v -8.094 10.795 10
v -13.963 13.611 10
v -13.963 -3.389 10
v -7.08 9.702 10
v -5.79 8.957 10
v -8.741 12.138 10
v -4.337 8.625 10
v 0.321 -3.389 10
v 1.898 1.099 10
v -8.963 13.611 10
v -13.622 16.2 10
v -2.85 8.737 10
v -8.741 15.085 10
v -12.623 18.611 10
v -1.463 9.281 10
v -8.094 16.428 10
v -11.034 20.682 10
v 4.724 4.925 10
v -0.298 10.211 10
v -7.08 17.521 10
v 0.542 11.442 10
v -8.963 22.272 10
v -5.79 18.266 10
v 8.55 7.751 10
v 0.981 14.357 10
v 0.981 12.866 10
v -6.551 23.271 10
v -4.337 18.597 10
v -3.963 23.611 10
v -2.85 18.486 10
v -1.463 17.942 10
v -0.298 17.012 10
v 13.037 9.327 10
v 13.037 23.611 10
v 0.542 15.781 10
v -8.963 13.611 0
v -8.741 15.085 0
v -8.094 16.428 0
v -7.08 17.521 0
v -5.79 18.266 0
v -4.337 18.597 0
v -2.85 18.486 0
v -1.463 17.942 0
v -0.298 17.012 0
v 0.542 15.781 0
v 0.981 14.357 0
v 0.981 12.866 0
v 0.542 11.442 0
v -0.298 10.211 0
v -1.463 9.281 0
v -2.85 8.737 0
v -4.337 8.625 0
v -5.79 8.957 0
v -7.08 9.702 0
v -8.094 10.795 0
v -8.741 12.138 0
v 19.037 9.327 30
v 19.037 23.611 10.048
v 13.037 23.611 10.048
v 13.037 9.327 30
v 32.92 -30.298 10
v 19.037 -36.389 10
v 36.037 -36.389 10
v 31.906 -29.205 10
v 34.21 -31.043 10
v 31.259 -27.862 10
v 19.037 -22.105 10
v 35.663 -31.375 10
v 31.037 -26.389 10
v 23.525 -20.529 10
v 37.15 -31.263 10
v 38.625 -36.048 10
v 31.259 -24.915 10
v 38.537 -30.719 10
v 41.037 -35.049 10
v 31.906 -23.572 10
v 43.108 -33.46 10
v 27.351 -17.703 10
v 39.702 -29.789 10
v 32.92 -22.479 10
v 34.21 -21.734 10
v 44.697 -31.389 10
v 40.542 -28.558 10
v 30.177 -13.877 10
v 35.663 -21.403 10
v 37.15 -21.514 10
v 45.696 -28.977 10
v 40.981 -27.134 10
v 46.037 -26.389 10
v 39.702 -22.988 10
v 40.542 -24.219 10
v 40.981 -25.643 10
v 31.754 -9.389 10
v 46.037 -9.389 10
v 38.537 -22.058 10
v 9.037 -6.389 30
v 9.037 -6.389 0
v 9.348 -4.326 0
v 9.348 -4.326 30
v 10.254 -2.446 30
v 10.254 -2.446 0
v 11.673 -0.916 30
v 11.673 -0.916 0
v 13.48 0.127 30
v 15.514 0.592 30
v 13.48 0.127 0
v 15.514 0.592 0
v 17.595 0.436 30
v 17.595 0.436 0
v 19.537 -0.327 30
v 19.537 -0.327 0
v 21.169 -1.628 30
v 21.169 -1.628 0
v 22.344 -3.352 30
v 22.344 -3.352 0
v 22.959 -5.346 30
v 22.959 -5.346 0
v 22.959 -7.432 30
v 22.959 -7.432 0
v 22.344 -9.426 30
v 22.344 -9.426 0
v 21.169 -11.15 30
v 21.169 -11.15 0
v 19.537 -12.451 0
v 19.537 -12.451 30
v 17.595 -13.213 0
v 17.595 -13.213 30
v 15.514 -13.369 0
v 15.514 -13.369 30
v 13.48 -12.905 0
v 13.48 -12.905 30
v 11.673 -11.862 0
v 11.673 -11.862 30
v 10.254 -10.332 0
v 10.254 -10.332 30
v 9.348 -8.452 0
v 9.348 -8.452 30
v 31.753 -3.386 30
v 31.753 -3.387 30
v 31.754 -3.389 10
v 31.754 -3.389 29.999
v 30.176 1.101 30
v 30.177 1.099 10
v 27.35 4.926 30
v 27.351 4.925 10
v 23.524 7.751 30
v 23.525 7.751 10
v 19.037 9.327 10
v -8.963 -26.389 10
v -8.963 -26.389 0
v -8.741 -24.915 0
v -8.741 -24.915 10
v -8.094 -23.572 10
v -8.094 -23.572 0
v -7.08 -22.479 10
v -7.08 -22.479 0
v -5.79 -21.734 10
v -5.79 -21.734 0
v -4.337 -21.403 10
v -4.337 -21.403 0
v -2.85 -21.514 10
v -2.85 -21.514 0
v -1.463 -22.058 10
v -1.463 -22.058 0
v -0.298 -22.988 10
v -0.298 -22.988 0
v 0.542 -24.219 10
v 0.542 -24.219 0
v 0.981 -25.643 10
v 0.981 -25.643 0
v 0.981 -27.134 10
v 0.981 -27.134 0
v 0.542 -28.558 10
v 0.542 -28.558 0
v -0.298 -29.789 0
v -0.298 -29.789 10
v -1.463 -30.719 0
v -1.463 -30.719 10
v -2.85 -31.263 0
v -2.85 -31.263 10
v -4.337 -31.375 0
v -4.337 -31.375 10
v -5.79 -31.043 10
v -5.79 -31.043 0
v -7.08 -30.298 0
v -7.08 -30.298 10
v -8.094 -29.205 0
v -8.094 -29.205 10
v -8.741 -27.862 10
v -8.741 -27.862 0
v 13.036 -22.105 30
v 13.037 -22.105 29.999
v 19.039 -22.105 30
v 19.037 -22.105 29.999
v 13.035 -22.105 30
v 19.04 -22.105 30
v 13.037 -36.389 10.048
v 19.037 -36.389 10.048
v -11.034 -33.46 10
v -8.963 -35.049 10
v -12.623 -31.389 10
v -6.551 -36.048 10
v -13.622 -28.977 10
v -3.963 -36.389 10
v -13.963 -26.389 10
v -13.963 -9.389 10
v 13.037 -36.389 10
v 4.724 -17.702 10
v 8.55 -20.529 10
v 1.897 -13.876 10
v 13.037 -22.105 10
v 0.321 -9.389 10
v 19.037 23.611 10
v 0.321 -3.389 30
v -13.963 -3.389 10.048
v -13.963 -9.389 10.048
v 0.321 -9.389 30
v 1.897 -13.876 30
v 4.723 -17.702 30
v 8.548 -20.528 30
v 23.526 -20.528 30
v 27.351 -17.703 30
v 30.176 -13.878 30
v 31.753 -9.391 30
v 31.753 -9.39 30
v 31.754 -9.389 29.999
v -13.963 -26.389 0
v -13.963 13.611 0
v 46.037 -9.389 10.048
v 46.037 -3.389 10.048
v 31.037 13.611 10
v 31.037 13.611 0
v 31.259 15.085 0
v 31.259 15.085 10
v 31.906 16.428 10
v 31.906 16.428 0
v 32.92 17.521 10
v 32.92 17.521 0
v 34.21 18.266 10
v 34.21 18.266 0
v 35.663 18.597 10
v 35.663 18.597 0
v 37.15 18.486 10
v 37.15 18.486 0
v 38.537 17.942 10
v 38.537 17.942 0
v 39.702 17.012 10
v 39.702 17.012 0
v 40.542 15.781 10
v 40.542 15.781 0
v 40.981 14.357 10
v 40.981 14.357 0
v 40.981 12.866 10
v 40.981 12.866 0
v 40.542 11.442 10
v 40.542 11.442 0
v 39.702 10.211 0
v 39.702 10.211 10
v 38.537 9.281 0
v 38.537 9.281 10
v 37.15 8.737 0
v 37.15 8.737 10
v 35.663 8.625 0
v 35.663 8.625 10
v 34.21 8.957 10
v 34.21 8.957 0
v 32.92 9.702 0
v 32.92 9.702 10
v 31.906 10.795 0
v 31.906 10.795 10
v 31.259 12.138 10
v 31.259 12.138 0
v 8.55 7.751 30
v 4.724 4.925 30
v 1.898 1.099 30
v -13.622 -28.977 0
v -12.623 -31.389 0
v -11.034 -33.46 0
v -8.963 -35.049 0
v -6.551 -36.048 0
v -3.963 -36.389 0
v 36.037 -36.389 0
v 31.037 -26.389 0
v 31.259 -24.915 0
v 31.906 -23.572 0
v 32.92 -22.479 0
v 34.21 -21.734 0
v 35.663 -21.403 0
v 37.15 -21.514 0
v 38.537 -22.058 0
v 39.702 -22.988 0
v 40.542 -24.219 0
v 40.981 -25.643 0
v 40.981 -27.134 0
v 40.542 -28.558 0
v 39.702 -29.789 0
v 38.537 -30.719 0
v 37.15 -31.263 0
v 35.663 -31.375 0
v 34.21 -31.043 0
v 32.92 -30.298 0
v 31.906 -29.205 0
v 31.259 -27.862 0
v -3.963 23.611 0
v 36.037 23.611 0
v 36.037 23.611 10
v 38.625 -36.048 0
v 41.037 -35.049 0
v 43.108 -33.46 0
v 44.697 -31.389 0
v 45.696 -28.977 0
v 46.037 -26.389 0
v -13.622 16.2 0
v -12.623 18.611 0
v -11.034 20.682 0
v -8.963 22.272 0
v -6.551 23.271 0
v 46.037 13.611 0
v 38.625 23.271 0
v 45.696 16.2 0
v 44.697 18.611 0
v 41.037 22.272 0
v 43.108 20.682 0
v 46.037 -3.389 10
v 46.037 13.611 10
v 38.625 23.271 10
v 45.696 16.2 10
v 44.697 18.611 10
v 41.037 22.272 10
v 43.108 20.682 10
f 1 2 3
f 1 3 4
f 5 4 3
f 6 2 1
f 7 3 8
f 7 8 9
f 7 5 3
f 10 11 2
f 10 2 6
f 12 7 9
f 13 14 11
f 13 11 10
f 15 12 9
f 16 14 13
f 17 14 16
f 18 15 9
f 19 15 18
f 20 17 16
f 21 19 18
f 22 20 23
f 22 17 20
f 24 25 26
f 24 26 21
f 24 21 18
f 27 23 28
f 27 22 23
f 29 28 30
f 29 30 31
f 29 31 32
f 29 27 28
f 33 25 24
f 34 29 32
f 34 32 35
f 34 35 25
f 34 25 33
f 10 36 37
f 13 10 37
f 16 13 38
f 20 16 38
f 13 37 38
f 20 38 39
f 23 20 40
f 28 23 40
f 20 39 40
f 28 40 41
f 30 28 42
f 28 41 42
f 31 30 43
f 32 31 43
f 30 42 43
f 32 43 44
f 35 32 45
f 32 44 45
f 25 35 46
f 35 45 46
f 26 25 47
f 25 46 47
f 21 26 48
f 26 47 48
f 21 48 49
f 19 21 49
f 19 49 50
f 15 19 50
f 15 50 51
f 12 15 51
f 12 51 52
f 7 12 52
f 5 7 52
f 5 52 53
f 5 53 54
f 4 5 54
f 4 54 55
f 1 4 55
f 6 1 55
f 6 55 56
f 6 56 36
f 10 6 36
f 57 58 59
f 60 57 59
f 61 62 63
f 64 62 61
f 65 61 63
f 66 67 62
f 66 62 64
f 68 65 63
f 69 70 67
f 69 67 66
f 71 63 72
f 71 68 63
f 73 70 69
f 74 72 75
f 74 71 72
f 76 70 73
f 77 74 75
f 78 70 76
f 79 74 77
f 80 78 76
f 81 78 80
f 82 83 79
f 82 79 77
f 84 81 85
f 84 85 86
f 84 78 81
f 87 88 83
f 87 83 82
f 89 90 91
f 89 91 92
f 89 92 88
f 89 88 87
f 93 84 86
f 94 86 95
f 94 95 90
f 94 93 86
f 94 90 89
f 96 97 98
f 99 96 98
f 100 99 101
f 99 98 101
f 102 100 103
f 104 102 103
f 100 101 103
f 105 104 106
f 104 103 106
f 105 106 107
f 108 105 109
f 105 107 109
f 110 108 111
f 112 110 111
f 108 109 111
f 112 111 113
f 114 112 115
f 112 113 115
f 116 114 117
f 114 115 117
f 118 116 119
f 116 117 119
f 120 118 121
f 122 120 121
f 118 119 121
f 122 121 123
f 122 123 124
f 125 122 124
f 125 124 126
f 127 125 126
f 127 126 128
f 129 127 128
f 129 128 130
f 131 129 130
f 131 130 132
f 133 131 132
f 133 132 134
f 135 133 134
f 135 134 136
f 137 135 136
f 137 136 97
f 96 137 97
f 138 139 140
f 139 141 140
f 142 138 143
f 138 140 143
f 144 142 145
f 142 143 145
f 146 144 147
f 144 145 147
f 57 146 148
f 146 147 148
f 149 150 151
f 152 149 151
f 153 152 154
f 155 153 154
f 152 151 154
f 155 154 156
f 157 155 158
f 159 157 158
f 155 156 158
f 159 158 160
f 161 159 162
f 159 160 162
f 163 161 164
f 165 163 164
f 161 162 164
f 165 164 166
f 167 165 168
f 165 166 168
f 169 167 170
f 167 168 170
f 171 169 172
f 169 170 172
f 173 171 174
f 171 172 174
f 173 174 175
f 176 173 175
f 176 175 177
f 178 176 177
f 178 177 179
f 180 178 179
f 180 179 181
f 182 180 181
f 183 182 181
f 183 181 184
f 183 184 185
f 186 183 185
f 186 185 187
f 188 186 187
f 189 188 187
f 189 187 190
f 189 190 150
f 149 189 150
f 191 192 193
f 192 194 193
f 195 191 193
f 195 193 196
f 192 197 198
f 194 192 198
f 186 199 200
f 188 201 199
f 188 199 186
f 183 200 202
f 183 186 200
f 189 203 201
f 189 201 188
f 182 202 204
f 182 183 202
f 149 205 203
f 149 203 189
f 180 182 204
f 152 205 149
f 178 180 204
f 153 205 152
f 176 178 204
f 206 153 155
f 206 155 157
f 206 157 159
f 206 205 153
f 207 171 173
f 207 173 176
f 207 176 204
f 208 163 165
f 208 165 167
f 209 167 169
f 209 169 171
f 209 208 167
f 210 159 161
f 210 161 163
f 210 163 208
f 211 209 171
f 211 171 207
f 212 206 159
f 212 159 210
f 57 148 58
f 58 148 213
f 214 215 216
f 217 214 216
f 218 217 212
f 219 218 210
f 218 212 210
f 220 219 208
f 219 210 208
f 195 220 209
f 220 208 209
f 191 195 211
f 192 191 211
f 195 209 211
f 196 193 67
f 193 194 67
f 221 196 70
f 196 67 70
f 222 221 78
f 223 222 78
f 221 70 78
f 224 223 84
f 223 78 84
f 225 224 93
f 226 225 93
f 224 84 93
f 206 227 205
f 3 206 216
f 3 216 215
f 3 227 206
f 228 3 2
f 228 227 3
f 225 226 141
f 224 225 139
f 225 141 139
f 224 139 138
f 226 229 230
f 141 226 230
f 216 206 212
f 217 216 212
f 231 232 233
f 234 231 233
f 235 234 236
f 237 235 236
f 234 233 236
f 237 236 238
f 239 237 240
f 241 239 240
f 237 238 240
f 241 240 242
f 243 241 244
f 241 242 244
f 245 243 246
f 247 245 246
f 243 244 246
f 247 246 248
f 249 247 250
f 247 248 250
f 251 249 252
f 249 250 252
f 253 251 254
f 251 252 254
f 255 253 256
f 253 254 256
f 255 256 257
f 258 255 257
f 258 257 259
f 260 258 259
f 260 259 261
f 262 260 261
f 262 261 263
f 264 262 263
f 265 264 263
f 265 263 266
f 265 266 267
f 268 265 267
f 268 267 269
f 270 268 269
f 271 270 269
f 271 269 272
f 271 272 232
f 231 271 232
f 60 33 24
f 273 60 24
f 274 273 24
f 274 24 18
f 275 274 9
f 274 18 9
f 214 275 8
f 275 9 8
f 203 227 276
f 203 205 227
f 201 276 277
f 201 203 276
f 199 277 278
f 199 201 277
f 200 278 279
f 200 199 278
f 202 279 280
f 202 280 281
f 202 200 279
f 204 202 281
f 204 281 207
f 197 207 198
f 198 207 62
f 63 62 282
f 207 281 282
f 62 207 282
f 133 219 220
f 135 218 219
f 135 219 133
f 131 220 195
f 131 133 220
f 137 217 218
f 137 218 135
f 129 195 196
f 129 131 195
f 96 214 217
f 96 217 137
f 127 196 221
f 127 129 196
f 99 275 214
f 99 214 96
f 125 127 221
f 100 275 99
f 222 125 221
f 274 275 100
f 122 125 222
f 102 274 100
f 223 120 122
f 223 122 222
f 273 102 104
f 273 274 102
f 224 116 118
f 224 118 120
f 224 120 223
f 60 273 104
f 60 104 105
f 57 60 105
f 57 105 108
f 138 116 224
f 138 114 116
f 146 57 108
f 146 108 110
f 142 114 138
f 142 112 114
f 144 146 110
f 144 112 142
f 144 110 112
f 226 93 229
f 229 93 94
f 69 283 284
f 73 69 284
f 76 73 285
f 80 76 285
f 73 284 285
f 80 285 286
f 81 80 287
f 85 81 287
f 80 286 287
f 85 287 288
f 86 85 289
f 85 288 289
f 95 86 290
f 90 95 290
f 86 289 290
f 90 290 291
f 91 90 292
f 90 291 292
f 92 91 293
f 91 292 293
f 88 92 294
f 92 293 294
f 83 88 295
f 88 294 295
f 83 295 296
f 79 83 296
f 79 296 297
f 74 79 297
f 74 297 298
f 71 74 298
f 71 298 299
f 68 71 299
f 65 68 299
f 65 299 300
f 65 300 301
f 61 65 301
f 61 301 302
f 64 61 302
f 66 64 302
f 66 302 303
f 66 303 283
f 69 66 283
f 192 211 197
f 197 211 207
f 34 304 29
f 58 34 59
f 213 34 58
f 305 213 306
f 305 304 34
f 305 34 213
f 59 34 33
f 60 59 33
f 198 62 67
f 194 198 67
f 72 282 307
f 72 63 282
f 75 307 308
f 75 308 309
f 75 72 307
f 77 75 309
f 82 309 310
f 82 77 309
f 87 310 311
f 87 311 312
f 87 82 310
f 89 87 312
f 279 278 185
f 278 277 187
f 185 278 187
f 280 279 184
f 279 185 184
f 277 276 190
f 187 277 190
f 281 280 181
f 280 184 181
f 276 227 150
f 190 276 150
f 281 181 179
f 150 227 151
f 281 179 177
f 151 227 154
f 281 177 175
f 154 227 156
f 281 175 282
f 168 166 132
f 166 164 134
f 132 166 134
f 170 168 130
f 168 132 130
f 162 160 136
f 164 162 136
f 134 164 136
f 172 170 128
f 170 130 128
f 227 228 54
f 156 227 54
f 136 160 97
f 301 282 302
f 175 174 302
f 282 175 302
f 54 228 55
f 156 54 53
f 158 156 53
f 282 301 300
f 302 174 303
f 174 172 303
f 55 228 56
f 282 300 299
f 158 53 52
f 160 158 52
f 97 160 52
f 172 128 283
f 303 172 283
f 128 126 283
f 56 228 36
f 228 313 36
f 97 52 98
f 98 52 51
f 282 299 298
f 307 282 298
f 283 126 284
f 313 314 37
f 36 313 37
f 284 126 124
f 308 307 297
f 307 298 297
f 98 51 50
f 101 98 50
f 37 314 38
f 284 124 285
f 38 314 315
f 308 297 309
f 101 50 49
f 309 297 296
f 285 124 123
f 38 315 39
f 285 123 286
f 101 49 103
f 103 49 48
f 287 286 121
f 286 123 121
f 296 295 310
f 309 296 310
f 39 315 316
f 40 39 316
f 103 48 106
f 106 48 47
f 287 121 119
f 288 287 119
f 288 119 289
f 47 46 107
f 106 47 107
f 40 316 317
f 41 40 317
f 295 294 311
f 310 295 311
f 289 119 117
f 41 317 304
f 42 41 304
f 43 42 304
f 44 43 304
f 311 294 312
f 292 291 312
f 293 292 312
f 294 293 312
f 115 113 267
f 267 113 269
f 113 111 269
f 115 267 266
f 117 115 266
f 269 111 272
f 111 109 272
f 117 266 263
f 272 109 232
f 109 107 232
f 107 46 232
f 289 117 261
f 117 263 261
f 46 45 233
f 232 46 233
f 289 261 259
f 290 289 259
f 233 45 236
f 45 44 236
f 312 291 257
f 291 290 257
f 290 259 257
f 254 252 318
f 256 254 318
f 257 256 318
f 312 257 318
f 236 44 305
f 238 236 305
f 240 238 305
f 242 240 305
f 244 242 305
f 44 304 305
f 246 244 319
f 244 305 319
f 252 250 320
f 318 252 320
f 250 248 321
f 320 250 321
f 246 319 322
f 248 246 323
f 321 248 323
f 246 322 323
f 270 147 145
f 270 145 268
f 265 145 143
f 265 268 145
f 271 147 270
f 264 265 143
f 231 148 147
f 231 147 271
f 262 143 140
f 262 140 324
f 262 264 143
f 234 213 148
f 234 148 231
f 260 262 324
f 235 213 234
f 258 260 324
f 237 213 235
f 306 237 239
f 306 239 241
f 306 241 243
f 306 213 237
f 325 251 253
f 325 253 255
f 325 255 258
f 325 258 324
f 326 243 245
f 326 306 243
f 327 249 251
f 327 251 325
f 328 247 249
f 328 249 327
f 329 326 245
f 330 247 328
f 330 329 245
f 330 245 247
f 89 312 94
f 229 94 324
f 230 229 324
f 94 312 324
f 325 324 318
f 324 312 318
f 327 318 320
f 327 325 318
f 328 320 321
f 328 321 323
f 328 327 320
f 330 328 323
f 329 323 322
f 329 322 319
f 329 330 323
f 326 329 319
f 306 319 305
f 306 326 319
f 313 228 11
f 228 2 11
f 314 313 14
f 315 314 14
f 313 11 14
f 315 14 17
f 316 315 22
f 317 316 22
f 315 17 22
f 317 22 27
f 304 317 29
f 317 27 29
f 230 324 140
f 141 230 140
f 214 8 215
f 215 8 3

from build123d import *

# Parameters (mm, degrees)
F0_W     = 60
F0_H     = 60
F1_DEPTH = 10
F2_R     = 10
F4_D     = 10
F5_DEPTH = 20
F7_D     = 14
F7_DEPTH = 31
F7_TIP   = 4.2060243332
F8_SIZE2 = 19.9516800852
F8_SIZE  = 14.284


with BuildPart() as f1:
    # F0 (on Top) → F1 (new body)
    with BuildSketch(Plane.XY):
        with Locations((16.0370518267, -6.3885685802)):
            Rectangle(F0_W, F0_H)
    extrude(amount=F1_DEPTH)

    # F2
    f2_edges = [f1.edges().sort_by_distance(p)[0] for p in [
        (-13.962948, 23.611431, 5),
        (46.037052, 23.611431, 5),
        (46.037052, -36.388569, 5),
        (-13.962948, -36.388569, 5),
    ]]
    fillet(f2_edges, radius=F2_R)

    # F4 (through all)
    with Locations(Plane.XY.offset(10)):
        with Locations((-3.9629481733, 13.6114314198), (36.0370518267, 13.6114314198), (36.0370518267, -26.3885685802), (-3.9629481733, -26.3885685802)):
            Hole(F4_D / 2)

    # F3 (on face) → F5 (join)
    with BuildSketch(Plane.XY.offset(10)):
        with BuildLine():
            ThreePointArc((31.7535637154, -9.3888022257), (31.9662305079, -7.8954975618), (32.0373300699, -6.3888022257))
            ThreePointArc((32.0373300699, -6.3888022257), (31.9662305079, -4.8821068895), (31.7535637154, -3.3888022257))
            ThreePointArc((31.7535637154, -3.3888022257), (27.3510385689, 4.9249062733), (19.0373300699, 9.3274314198))
            ThreePointArc((19.0373300699, 9.3274314198), (16.0373300699, 9.6111977743), (13.0373300699, 9.3274314198))
            ThreePointArc((13.0373300699, 9.3274314198), (4.723621571, 4.9249062733), (0.3210964244, -3.3888022257))
            ThreePointArc((0.3210964244, -3.3888022257), (0.0373300704, -6.3886832938), (0.3210518267, -9.3885685802))
            ThreePointArc((0.3210518267, -9.3885685802), (4.7235374737, -17.7024266268), (13.0373300699, -22.1050358712))
            ThreePointArc((13.0373300699, -22.1050358712), (16.0373300699, -22.3888022257), (19.0373300699, -22.1050358712))
            ThreePointArc((19.0373300699, -22.1050358712), (27.3510385689, -17.7025107246), (31.7535637154, -9.3888022257))
        make_face()
        with BuildLine():
            ThreePointArc((31.7535637154, -3.3888022257), (31.9662305079, -4.8821068895), (32.0373300699, -6.3888022257))
            ThreePointArc((32.0373300699, -6.3888022257), (31.9662305079, -7.8954975618), (31.7535637154, -9.3888022257))
            Line((31.7535637154, -9.3888022257), (46.0370518267, -9.3888022257))
            Line((46.0370518267, -9.3888022257), (46.0370518267, -6.3885685802))
            Line((46.0370518267, -6.3885685802), (46.0370518267, -3.3888022257))
            Line((46.0370518267, -3.3888022257), (31.7535637154, -3.3888022257))
        make_face()
        with BuildLine():
            ThreePointArc((13.0373300699, 9.3274314198), (16.0373300699, 9.6111977743), (19.0373300699, 9.3274314198))
            Line((19.0373300699, 9.3274314198), (19.0373300699, 23.6114314198))
            Line((19.0373300699, 23.6114314198), (16.0370518267, 23.6114314198))
            Line((16.0370518267, 23.6114314198), (13.0373300699, 23.6114314198))
            Line((13.0373300699, 23.6114314198), (13.0373300699, 9.3274314198))
        make_face()
        with BuildLine():
            Line((19.0373300699, -36.3885685802), (19.0373300699, -22.1050358712))
            ThreePointArc((19.0373300699, -22.1050358712), (16.0373300699, -22.3888022257), (13.0373300699, -22.1050358712))
            Line((13.0373300699, -22.1050358712), (13.0373300699, -36.3885685802))
            Line((13.0373300699, -36.3885685802), (16.0370518267, -36.3885685802))
            Line((16.0370518267, -36.3885685802), (19.0373300699, -36.3885685802))
        make_face()
        with BuildLine():
            ThreePointArc((0.3210518267, -9.3885685802), (0.0373300704, -6.3886832938), (0.3210964244, -3.3888022257))
            Line((0.3210964244, -3.3888022257), (-13.9629481733, -3.3888022257))
            Line((-13.9629481733, -3.3888022257), (-13.9629481733, -6.3885685802))
            Line((-13.9629481733, -6.3885685802), (-13.9629481733, -9.3885685802))
            Line((-13.9629481733, -9.3885685802), (0.3210518267, -9.3885685802))
        make_face()
    extrude(amount=F5_DEPTH)

    # F7
    with Locations(Plane.XY.offset(30)):
        with Locations((16.0373300699, -6.3888022257)):
            Hole(F7_D / 2, depth=F7_DEPTH)
            with Locations((0, 0, -(F7_DEPTH + F7_TIP / 2))):  # 118° drill point
                Cone(0, F7_D / 2, F7_TIP, mode=Mode.SUBTRACT)

    # F8
    f8_edges = [f1.edges().sort_by_distance(p)[0] for p in [
        (-13.962948, -6.388685, 30),
        (16.03733, 23.611431, 30),
        (46.037052, -6.388802, 30),
        (16.03733, -36.388569, 30),
    ]]
    f8_side = f1.faces().sort_by_distance((26.751039, 4.324906, 30))[0]
    chamfer(f8_edges, length=F8_SIZE, length2=F8_SIZE2, reference=f8_side)


solid = f1.part
